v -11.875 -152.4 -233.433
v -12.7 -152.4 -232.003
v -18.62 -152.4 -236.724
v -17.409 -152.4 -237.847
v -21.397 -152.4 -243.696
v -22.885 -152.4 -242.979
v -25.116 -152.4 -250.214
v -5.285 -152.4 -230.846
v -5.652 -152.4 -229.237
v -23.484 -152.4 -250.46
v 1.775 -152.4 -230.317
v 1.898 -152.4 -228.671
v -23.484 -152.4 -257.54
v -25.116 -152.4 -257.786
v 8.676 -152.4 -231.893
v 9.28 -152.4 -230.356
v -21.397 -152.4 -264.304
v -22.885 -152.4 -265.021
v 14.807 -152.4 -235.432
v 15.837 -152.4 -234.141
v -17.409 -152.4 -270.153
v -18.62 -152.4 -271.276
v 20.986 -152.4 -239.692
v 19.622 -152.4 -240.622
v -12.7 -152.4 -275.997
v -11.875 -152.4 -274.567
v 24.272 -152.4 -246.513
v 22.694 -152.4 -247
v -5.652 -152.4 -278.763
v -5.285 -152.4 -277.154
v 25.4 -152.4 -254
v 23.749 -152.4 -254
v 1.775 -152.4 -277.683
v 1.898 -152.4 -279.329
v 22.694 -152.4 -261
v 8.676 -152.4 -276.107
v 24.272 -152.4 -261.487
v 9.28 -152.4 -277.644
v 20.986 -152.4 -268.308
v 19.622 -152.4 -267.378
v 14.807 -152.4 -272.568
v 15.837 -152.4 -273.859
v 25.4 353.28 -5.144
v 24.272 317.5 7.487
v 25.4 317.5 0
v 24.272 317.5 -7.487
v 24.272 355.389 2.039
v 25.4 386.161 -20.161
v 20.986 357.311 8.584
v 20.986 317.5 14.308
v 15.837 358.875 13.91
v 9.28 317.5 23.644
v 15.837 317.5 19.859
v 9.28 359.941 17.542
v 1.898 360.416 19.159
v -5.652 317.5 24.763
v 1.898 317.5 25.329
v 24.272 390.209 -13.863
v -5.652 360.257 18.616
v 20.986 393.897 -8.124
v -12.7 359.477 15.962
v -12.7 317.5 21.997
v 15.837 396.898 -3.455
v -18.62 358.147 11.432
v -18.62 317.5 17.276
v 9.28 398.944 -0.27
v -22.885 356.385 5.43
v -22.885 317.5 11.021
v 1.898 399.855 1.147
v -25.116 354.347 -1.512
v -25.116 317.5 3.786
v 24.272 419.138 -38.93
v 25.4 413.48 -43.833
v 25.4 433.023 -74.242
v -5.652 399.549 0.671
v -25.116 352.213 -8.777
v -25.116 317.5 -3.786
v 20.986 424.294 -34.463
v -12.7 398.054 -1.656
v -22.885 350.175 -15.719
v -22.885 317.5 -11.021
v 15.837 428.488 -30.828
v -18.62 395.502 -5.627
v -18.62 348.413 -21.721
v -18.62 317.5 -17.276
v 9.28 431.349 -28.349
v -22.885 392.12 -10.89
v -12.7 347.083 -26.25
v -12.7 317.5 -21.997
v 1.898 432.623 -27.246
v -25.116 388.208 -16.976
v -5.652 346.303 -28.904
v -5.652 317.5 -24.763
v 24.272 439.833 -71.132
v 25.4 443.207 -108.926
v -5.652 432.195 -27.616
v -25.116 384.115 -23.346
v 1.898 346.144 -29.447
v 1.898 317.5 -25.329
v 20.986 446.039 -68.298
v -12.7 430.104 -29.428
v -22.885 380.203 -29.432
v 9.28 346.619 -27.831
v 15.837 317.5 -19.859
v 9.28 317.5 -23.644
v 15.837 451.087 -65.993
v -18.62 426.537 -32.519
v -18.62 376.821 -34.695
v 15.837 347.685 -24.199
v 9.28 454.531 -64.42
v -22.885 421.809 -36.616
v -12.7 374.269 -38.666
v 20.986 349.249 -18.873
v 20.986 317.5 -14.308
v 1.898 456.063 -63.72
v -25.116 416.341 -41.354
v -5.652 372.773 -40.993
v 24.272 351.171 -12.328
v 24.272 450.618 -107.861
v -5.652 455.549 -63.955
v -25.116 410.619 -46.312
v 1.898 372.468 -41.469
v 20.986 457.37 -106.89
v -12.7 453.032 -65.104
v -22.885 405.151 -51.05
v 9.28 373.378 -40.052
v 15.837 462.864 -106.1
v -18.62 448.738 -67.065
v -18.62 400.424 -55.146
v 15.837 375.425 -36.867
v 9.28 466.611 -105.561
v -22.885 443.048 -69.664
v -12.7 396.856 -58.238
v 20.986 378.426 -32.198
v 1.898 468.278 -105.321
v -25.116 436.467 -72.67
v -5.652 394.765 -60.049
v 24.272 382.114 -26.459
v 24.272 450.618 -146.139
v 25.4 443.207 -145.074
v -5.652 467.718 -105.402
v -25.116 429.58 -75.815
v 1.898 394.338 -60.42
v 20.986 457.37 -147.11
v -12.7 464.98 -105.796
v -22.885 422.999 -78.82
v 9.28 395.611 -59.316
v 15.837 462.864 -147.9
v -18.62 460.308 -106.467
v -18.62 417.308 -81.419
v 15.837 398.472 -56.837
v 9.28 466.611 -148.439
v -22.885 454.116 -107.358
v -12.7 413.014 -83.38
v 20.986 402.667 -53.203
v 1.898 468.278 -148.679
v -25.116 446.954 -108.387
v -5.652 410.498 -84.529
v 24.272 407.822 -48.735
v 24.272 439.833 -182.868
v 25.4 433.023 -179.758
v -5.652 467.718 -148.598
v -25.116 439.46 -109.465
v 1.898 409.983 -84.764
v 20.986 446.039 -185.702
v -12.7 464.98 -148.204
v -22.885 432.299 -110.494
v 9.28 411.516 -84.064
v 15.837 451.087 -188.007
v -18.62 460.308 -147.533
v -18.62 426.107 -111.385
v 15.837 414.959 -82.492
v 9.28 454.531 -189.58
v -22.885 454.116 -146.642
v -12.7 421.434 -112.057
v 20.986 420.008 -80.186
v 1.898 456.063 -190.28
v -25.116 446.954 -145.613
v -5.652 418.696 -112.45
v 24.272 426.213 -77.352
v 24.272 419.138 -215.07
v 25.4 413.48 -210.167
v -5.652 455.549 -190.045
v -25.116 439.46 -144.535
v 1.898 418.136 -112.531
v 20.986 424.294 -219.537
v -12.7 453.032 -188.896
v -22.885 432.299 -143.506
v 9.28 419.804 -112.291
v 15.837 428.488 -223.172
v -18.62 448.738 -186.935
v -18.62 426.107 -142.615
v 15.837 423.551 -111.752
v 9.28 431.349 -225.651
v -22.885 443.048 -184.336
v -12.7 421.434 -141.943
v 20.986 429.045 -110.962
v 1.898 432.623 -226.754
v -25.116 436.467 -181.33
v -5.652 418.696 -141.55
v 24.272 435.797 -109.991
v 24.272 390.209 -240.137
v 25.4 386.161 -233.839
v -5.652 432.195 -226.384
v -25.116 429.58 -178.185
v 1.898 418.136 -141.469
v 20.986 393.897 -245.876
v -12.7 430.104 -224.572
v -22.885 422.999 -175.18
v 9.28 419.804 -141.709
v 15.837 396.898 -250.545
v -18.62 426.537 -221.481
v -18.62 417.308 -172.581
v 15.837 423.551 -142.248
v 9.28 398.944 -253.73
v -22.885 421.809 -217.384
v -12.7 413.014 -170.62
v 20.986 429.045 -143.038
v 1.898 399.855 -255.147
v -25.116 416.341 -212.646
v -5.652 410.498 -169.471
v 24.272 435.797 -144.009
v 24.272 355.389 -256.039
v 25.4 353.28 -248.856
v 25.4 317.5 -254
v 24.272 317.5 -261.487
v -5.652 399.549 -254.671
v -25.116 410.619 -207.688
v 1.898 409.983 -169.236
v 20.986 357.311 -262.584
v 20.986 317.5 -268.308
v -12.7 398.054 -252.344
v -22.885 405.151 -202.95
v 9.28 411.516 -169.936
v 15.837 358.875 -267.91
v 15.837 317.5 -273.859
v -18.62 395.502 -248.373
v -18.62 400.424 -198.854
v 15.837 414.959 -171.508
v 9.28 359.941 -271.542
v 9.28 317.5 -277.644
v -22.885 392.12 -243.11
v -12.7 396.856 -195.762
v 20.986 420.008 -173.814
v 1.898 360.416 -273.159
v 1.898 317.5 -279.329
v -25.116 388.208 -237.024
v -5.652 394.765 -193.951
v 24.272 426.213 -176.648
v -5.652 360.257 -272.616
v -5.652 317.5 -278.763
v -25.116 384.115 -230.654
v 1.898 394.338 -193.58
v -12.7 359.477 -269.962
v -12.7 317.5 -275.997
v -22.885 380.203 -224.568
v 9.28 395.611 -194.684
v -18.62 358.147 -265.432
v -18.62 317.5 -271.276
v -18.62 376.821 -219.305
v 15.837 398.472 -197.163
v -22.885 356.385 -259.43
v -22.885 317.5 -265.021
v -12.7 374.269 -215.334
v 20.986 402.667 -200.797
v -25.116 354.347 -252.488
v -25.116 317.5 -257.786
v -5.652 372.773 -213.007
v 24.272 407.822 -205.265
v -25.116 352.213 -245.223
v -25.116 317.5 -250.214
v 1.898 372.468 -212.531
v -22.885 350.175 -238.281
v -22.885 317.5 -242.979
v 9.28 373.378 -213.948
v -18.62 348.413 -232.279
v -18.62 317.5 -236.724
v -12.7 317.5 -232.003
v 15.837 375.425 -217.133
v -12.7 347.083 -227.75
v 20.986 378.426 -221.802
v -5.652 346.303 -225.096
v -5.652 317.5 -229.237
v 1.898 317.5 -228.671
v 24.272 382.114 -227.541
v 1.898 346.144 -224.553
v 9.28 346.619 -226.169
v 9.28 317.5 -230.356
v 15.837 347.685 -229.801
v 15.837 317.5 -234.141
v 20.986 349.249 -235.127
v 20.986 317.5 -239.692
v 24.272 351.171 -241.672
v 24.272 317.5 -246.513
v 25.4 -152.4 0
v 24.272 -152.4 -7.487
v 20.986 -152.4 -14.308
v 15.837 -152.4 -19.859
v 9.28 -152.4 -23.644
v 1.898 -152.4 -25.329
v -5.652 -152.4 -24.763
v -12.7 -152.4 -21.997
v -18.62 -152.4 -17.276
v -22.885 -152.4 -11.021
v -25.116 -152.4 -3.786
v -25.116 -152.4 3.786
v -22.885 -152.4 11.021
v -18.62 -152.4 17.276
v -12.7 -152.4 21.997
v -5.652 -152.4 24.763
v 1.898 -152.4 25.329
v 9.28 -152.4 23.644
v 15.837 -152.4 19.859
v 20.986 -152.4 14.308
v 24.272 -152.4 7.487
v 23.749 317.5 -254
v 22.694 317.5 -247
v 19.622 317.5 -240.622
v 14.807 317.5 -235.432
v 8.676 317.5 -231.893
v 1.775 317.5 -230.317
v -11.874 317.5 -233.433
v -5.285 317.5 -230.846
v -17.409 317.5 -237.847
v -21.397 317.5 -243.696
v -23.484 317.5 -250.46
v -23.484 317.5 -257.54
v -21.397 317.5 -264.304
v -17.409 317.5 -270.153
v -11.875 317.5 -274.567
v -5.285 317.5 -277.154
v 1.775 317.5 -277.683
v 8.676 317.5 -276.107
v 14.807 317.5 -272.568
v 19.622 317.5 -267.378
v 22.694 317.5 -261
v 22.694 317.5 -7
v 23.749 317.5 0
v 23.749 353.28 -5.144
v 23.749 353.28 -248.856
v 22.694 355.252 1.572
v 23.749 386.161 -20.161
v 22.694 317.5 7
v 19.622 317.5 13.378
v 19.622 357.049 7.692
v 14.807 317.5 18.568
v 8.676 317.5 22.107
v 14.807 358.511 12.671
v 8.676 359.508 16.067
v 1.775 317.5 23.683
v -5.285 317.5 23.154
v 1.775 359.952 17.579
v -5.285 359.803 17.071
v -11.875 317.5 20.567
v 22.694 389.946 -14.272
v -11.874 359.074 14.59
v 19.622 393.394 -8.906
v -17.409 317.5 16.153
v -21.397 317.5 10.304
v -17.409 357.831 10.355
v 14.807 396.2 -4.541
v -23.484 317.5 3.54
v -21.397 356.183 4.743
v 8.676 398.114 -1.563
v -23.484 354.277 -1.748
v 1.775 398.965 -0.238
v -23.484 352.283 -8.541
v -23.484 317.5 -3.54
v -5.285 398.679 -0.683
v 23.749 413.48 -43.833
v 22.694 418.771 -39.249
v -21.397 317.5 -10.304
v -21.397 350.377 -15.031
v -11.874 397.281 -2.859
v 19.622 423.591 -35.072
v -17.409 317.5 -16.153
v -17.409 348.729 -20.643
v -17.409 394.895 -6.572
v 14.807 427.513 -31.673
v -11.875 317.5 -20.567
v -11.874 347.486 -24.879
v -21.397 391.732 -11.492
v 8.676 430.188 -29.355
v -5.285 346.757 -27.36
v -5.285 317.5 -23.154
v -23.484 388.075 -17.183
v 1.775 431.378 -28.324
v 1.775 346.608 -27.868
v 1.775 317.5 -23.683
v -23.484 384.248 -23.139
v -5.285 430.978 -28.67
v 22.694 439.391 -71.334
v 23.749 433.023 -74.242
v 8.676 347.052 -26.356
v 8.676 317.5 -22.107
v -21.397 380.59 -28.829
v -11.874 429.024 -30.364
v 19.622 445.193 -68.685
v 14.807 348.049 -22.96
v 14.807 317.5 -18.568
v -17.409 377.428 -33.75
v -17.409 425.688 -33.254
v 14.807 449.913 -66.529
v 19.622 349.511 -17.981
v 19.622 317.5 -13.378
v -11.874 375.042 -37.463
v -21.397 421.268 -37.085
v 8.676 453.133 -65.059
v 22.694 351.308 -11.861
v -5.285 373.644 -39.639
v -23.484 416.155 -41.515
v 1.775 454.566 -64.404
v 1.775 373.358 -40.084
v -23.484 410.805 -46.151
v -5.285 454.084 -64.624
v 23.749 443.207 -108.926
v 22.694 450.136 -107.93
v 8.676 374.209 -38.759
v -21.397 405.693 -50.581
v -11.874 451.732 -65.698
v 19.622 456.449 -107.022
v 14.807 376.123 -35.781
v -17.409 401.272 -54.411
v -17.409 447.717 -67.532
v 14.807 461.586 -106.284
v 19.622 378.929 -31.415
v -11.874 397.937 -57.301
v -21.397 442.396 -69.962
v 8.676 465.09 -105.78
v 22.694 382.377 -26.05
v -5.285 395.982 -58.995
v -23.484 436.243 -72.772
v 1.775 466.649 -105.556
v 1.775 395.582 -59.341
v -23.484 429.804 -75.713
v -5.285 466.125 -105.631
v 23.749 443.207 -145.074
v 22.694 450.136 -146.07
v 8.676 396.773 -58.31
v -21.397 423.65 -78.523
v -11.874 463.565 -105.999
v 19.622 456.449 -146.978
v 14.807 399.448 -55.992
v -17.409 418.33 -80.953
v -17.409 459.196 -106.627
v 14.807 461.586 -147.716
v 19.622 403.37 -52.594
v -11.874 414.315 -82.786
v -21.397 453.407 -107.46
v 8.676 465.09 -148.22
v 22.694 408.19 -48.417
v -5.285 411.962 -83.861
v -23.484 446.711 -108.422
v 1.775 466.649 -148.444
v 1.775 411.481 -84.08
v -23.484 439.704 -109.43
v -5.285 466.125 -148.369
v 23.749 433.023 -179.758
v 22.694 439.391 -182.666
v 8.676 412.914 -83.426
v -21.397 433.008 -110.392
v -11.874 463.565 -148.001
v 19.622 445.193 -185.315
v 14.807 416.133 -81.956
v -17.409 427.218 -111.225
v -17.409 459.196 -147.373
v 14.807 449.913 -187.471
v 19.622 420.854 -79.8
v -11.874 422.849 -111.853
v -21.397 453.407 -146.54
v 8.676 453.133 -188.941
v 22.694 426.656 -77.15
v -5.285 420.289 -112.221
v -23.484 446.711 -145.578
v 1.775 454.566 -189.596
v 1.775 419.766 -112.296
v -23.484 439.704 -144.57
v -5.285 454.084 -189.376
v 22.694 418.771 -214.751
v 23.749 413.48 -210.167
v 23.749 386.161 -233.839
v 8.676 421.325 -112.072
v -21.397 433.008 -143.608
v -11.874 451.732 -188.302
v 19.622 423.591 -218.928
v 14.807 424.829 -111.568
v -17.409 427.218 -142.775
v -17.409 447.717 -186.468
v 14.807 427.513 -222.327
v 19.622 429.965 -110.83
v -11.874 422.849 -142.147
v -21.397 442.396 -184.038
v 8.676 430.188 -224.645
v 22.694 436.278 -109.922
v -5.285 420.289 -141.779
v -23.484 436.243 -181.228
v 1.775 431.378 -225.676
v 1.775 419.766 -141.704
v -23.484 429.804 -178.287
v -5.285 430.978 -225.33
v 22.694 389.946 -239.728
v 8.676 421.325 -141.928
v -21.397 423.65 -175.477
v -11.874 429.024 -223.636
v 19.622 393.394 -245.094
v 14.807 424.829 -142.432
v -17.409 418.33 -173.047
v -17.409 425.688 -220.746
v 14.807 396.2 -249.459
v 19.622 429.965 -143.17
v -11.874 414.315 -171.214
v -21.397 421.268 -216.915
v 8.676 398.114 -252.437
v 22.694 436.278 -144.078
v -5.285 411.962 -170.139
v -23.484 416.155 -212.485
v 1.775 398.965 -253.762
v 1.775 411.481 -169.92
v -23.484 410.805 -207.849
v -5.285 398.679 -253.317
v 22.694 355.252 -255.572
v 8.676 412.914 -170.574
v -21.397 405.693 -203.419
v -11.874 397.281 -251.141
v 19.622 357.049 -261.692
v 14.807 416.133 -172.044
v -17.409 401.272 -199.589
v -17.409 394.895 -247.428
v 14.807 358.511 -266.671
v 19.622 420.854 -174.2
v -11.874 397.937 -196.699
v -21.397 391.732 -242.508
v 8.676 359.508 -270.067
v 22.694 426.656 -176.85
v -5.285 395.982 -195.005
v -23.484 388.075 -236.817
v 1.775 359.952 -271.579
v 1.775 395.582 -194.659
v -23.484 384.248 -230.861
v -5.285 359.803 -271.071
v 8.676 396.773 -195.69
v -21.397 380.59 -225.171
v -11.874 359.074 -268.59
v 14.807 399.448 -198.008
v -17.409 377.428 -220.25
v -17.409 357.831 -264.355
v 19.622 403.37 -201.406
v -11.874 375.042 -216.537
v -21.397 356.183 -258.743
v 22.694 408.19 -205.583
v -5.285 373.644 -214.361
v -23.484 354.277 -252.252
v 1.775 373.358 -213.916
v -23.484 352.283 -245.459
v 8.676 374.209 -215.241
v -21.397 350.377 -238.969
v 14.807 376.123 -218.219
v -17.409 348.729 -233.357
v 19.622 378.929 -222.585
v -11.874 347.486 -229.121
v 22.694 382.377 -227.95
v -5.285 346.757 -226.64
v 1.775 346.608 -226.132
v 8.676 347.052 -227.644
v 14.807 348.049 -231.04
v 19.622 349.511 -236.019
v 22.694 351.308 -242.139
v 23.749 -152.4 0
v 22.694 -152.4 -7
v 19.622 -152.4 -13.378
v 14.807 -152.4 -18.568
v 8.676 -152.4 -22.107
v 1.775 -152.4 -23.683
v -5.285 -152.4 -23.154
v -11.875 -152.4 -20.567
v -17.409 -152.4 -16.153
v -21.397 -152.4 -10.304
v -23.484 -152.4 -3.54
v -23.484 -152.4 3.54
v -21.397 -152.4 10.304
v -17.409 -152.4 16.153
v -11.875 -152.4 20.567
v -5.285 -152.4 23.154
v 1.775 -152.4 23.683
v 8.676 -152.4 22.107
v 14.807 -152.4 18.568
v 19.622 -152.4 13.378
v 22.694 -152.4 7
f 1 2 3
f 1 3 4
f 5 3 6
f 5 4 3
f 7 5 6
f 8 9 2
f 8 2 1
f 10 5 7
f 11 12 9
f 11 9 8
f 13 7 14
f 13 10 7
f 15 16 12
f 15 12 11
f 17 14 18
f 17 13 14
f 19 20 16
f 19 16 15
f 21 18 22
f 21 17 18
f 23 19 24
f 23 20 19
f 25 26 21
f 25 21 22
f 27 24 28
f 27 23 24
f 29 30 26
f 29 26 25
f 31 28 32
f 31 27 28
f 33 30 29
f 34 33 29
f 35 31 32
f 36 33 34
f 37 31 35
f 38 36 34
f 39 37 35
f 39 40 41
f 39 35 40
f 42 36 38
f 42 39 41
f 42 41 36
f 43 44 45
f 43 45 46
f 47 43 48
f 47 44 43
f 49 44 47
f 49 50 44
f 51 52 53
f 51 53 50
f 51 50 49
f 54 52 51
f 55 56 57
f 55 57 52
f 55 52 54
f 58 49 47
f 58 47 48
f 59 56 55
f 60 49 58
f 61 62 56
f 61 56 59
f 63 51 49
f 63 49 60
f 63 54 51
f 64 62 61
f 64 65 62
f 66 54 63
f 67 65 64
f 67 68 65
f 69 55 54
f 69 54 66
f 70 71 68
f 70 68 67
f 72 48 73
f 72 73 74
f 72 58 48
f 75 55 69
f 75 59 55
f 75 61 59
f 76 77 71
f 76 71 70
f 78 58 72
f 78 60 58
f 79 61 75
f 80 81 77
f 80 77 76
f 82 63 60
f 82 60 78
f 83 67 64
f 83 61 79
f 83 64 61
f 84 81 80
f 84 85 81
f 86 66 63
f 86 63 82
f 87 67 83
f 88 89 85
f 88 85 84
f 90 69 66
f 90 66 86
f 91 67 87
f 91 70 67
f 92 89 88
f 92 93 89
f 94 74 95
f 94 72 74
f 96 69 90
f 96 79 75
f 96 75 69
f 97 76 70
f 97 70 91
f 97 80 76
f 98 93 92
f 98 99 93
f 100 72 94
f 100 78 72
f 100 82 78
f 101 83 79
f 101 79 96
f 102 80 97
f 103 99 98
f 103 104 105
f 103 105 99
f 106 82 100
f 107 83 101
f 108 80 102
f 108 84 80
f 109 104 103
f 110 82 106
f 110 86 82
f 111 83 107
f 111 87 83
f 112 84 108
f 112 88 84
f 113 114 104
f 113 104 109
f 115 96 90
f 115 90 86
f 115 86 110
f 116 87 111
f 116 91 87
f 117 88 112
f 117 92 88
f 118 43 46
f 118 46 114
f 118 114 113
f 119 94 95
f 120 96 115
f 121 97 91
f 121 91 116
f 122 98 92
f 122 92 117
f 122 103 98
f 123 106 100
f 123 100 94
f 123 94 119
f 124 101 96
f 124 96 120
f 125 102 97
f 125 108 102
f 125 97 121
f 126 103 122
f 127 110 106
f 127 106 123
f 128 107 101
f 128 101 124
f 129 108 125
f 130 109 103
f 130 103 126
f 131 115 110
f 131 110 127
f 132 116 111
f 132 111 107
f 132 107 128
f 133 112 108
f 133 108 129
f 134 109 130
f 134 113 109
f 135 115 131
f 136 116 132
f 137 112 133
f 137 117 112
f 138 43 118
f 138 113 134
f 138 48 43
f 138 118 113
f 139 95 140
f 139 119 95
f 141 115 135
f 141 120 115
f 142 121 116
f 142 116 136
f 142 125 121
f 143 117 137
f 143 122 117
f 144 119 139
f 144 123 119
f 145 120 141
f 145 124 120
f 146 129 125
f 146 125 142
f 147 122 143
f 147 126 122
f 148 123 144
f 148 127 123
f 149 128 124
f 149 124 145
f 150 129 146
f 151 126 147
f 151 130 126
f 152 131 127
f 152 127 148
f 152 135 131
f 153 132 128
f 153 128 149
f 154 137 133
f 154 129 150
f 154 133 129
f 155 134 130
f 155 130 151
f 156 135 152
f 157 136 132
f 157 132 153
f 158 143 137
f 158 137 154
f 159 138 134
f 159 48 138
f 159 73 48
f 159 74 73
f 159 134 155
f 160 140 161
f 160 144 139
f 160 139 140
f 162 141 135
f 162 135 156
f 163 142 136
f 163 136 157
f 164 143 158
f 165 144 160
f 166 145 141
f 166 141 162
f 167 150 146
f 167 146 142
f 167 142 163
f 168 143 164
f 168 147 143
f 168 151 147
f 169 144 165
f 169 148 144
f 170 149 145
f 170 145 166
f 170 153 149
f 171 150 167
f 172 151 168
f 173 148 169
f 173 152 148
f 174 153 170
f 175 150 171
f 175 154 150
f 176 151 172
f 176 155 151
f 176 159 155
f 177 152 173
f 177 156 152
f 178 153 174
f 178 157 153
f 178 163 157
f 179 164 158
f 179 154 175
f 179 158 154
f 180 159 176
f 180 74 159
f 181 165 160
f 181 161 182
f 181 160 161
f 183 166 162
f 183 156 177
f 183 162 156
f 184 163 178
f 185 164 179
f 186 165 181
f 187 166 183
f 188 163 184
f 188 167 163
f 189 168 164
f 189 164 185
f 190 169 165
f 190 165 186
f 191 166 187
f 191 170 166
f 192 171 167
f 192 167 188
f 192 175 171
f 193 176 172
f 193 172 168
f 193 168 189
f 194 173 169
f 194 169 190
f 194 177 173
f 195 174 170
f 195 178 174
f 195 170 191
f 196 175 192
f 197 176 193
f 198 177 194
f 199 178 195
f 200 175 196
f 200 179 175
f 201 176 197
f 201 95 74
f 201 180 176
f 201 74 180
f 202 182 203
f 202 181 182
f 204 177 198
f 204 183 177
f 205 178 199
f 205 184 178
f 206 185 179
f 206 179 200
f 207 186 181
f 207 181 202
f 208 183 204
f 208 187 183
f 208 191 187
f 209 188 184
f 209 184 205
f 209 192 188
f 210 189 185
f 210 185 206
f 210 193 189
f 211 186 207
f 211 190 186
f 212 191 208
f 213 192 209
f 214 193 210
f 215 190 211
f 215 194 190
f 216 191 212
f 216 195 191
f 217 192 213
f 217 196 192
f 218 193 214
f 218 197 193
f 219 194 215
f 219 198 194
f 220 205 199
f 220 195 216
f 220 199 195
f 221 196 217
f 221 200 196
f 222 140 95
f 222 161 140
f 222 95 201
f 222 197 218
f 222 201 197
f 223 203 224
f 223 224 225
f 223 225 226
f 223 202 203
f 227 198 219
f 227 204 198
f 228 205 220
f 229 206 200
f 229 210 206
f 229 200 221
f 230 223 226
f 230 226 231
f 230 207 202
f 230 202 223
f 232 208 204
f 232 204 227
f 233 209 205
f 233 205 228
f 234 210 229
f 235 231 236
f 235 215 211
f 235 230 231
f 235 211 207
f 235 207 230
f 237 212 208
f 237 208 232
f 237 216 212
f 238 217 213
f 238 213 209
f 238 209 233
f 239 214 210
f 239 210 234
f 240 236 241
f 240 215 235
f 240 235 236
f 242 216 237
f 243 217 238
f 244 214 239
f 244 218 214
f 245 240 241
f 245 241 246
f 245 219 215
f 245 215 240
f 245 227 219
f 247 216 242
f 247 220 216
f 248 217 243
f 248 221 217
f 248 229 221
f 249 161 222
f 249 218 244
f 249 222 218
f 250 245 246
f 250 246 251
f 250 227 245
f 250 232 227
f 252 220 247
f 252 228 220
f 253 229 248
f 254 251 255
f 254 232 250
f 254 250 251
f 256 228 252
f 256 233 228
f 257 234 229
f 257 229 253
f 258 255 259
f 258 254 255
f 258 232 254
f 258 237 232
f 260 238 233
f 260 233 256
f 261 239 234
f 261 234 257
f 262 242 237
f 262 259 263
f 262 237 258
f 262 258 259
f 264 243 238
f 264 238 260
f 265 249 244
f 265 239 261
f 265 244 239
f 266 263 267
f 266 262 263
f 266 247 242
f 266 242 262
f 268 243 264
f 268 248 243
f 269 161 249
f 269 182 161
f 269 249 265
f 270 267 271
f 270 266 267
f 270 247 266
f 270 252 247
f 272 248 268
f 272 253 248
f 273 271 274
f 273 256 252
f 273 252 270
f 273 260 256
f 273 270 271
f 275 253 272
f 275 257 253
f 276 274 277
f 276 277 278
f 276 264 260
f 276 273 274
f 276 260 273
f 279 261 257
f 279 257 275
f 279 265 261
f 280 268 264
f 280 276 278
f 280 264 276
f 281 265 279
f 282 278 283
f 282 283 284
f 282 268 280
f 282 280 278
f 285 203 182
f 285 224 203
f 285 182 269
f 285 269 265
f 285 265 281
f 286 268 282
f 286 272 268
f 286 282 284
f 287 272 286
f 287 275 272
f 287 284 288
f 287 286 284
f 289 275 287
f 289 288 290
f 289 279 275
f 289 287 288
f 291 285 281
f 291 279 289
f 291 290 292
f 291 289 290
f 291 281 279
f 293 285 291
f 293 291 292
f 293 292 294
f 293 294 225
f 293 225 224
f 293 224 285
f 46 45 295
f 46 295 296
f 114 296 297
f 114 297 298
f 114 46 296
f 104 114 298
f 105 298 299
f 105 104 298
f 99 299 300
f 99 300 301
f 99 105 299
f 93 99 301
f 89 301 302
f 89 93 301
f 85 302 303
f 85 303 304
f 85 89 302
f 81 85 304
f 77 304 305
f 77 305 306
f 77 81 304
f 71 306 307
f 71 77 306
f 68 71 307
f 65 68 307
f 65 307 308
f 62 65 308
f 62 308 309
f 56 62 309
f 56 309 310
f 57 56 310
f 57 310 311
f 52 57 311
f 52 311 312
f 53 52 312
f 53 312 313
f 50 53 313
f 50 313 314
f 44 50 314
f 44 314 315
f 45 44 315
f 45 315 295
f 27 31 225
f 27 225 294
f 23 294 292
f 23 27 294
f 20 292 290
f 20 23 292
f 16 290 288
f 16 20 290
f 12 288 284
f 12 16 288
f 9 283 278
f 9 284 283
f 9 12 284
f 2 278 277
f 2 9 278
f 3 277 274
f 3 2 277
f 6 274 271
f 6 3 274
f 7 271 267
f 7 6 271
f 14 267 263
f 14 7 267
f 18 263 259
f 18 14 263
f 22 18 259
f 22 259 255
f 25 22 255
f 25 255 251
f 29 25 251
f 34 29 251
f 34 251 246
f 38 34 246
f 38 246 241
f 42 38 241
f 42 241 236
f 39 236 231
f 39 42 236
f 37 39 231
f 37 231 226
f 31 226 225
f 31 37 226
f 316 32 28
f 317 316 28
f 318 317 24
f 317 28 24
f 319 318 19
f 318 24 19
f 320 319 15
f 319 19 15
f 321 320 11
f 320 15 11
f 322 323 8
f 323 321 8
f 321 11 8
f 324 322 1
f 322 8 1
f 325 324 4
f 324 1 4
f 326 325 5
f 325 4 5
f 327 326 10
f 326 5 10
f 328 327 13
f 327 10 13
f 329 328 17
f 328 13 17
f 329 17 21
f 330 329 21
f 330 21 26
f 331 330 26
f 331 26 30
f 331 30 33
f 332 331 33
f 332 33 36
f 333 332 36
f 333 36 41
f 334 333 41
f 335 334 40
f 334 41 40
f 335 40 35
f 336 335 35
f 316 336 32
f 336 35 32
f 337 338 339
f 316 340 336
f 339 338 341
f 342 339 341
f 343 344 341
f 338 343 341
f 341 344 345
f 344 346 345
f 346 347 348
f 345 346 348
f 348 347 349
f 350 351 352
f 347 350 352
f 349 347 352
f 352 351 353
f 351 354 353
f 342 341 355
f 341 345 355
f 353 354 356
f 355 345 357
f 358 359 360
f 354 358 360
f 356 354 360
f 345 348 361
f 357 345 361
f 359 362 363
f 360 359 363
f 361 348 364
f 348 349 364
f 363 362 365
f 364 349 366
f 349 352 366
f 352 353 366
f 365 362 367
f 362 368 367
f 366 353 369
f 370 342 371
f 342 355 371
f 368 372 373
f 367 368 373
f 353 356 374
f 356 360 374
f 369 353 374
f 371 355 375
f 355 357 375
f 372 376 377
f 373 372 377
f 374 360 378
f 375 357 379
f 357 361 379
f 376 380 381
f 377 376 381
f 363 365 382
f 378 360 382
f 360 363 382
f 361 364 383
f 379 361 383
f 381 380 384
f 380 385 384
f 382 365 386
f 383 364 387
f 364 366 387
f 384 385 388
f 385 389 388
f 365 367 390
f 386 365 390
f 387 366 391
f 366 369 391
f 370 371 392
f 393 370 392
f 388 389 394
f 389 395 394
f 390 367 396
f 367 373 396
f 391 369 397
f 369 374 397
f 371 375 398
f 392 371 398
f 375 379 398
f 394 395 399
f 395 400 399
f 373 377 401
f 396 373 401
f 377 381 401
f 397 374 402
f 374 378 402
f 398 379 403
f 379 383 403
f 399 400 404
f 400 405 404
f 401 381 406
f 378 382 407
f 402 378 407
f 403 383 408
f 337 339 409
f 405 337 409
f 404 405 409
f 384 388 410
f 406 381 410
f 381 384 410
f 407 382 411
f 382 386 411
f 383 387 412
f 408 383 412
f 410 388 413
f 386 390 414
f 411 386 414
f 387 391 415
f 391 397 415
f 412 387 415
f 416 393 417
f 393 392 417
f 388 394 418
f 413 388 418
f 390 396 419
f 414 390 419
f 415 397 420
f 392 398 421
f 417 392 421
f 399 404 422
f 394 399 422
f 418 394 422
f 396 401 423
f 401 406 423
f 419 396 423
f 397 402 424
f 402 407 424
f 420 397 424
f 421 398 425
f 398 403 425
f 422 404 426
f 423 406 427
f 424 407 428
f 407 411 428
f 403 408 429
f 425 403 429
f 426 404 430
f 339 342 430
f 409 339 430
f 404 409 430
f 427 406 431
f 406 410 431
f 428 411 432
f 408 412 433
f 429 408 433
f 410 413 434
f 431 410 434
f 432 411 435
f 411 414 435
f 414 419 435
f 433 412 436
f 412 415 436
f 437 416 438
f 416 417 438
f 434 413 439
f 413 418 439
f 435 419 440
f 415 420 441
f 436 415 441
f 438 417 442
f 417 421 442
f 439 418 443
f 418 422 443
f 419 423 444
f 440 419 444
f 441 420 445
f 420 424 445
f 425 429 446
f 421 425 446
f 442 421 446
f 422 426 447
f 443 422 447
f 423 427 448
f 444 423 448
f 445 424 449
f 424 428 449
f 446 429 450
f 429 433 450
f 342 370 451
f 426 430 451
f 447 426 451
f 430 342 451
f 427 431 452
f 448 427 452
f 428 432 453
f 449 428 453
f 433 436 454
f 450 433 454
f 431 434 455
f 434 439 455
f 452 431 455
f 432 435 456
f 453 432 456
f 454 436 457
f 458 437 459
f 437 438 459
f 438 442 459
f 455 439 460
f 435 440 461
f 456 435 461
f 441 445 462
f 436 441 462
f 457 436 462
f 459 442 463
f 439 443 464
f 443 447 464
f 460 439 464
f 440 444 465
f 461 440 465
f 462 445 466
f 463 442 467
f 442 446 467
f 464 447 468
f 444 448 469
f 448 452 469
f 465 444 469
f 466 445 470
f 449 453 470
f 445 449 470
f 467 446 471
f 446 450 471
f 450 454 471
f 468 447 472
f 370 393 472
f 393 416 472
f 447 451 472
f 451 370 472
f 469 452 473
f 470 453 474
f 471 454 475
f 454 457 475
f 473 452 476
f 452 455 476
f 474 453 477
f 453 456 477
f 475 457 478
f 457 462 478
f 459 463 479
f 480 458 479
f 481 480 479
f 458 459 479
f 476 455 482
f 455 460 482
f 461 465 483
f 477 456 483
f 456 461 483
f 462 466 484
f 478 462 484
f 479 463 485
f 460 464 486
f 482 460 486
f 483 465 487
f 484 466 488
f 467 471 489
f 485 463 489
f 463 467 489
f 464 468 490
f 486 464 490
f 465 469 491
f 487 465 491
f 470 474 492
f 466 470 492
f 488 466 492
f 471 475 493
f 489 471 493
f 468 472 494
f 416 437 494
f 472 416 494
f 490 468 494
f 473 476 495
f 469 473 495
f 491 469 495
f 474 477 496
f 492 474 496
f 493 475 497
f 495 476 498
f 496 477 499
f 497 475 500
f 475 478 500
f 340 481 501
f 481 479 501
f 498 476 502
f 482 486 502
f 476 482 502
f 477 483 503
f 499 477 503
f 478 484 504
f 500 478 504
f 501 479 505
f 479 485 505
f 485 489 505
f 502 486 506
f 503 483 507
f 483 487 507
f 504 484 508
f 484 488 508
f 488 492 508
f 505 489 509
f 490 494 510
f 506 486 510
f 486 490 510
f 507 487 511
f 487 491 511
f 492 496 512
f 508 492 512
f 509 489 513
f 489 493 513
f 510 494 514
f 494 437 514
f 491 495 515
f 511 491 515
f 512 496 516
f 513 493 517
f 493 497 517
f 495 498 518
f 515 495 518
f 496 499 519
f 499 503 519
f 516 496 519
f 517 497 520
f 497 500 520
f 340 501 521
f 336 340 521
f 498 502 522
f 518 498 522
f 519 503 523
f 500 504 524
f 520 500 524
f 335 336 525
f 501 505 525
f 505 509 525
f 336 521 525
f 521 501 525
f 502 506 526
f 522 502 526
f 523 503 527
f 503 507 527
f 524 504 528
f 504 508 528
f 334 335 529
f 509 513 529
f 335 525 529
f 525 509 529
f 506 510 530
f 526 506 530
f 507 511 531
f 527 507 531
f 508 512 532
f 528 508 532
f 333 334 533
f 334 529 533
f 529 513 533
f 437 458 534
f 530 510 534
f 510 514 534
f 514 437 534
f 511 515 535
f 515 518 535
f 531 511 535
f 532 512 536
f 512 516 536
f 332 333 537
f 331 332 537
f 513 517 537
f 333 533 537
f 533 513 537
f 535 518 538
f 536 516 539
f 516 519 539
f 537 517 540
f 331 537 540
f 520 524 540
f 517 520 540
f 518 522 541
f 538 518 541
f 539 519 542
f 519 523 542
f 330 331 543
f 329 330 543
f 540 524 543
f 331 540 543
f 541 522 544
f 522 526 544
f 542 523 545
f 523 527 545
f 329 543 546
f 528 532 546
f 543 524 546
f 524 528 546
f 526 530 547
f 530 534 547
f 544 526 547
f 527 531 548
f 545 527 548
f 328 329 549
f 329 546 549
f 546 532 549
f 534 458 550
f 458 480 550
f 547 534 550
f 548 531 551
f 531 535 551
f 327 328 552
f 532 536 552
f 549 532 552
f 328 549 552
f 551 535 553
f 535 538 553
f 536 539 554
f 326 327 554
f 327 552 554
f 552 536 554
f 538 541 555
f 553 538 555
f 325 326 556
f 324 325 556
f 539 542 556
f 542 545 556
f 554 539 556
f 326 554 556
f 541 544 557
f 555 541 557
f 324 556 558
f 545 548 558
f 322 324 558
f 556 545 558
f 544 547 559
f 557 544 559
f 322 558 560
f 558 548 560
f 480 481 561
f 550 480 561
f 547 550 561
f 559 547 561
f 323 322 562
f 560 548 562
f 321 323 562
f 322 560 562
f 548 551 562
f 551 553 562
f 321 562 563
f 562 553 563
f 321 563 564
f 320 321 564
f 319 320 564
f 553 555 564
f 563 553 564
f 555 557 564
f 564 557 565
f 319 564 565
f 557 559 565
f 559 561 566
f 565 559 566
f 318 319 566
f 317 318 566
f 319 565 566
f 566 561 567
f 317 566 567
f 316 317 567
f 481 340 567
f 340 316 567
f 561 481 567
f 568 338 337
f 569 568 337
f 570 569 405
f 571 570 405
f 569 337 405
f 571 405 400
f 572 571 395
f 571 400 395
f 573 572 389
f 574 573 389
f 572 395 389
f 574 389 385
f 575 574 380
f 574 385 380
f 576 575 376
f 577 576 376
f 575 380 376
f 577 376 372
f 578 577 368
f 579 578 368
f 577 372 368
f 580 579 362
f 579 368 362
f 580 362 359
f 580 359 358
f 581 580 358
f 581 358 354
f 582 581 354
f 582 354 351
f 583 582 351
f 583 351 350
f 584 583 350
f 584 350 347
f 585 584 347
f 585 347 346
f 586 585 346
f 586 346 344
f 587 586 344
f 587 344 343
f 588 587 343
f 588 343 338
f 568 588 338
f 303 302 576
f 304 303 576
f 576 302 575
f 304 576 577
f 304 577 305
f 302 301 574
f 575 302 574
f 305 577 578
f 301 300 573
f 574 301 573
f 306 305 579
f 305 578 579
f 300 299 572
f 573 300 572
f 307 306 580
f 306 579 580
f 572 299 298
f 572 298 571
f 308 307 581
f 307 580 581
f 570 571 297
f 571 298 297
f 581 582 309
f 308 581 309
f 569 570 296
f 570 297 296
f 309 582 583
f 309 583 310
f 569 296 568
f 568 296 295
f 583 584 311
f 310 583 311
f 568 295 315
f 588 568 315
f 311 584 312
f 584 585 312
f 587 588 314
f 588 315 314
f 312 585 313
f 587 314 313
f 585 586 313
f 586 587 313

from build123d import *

# Parameters (mm, degrees)
SKETCH2_R   = 25.4
SKETCH2_R_2 = 23.749


with BuildPart() as part:
    # Sweep1: sweep along a path in Sketch1
    with BuildLine(Plane(origin=(0, 0, 0), x_dir=(0, 0, -1), z_dir=(1, 0, 0))) as sweep1_path:
        Line((0, -152.4), (0, 0))
        Line((0, 0), (0, 317.5))
        ThreePointArc((0, 317.5), (127, 444.5), (254, 317.5))
        Line((254, 317.5), (254, 0))
        Line((254, 0), (254, -152.4))
    # Sketch2 → Sweep1 (sweep)
    with BuildSketch(Plane(origin=(0, -152.4, 0), x_dir=(1, 0, 0), z_dir=(0, 1, 0))):
        Circle(SKETCH2_R)
        Circle(SKETCH2_R_2, mode=Mode.SUBTRACT)
    sweep(path=sweep1_path.line)


solid = part.part
